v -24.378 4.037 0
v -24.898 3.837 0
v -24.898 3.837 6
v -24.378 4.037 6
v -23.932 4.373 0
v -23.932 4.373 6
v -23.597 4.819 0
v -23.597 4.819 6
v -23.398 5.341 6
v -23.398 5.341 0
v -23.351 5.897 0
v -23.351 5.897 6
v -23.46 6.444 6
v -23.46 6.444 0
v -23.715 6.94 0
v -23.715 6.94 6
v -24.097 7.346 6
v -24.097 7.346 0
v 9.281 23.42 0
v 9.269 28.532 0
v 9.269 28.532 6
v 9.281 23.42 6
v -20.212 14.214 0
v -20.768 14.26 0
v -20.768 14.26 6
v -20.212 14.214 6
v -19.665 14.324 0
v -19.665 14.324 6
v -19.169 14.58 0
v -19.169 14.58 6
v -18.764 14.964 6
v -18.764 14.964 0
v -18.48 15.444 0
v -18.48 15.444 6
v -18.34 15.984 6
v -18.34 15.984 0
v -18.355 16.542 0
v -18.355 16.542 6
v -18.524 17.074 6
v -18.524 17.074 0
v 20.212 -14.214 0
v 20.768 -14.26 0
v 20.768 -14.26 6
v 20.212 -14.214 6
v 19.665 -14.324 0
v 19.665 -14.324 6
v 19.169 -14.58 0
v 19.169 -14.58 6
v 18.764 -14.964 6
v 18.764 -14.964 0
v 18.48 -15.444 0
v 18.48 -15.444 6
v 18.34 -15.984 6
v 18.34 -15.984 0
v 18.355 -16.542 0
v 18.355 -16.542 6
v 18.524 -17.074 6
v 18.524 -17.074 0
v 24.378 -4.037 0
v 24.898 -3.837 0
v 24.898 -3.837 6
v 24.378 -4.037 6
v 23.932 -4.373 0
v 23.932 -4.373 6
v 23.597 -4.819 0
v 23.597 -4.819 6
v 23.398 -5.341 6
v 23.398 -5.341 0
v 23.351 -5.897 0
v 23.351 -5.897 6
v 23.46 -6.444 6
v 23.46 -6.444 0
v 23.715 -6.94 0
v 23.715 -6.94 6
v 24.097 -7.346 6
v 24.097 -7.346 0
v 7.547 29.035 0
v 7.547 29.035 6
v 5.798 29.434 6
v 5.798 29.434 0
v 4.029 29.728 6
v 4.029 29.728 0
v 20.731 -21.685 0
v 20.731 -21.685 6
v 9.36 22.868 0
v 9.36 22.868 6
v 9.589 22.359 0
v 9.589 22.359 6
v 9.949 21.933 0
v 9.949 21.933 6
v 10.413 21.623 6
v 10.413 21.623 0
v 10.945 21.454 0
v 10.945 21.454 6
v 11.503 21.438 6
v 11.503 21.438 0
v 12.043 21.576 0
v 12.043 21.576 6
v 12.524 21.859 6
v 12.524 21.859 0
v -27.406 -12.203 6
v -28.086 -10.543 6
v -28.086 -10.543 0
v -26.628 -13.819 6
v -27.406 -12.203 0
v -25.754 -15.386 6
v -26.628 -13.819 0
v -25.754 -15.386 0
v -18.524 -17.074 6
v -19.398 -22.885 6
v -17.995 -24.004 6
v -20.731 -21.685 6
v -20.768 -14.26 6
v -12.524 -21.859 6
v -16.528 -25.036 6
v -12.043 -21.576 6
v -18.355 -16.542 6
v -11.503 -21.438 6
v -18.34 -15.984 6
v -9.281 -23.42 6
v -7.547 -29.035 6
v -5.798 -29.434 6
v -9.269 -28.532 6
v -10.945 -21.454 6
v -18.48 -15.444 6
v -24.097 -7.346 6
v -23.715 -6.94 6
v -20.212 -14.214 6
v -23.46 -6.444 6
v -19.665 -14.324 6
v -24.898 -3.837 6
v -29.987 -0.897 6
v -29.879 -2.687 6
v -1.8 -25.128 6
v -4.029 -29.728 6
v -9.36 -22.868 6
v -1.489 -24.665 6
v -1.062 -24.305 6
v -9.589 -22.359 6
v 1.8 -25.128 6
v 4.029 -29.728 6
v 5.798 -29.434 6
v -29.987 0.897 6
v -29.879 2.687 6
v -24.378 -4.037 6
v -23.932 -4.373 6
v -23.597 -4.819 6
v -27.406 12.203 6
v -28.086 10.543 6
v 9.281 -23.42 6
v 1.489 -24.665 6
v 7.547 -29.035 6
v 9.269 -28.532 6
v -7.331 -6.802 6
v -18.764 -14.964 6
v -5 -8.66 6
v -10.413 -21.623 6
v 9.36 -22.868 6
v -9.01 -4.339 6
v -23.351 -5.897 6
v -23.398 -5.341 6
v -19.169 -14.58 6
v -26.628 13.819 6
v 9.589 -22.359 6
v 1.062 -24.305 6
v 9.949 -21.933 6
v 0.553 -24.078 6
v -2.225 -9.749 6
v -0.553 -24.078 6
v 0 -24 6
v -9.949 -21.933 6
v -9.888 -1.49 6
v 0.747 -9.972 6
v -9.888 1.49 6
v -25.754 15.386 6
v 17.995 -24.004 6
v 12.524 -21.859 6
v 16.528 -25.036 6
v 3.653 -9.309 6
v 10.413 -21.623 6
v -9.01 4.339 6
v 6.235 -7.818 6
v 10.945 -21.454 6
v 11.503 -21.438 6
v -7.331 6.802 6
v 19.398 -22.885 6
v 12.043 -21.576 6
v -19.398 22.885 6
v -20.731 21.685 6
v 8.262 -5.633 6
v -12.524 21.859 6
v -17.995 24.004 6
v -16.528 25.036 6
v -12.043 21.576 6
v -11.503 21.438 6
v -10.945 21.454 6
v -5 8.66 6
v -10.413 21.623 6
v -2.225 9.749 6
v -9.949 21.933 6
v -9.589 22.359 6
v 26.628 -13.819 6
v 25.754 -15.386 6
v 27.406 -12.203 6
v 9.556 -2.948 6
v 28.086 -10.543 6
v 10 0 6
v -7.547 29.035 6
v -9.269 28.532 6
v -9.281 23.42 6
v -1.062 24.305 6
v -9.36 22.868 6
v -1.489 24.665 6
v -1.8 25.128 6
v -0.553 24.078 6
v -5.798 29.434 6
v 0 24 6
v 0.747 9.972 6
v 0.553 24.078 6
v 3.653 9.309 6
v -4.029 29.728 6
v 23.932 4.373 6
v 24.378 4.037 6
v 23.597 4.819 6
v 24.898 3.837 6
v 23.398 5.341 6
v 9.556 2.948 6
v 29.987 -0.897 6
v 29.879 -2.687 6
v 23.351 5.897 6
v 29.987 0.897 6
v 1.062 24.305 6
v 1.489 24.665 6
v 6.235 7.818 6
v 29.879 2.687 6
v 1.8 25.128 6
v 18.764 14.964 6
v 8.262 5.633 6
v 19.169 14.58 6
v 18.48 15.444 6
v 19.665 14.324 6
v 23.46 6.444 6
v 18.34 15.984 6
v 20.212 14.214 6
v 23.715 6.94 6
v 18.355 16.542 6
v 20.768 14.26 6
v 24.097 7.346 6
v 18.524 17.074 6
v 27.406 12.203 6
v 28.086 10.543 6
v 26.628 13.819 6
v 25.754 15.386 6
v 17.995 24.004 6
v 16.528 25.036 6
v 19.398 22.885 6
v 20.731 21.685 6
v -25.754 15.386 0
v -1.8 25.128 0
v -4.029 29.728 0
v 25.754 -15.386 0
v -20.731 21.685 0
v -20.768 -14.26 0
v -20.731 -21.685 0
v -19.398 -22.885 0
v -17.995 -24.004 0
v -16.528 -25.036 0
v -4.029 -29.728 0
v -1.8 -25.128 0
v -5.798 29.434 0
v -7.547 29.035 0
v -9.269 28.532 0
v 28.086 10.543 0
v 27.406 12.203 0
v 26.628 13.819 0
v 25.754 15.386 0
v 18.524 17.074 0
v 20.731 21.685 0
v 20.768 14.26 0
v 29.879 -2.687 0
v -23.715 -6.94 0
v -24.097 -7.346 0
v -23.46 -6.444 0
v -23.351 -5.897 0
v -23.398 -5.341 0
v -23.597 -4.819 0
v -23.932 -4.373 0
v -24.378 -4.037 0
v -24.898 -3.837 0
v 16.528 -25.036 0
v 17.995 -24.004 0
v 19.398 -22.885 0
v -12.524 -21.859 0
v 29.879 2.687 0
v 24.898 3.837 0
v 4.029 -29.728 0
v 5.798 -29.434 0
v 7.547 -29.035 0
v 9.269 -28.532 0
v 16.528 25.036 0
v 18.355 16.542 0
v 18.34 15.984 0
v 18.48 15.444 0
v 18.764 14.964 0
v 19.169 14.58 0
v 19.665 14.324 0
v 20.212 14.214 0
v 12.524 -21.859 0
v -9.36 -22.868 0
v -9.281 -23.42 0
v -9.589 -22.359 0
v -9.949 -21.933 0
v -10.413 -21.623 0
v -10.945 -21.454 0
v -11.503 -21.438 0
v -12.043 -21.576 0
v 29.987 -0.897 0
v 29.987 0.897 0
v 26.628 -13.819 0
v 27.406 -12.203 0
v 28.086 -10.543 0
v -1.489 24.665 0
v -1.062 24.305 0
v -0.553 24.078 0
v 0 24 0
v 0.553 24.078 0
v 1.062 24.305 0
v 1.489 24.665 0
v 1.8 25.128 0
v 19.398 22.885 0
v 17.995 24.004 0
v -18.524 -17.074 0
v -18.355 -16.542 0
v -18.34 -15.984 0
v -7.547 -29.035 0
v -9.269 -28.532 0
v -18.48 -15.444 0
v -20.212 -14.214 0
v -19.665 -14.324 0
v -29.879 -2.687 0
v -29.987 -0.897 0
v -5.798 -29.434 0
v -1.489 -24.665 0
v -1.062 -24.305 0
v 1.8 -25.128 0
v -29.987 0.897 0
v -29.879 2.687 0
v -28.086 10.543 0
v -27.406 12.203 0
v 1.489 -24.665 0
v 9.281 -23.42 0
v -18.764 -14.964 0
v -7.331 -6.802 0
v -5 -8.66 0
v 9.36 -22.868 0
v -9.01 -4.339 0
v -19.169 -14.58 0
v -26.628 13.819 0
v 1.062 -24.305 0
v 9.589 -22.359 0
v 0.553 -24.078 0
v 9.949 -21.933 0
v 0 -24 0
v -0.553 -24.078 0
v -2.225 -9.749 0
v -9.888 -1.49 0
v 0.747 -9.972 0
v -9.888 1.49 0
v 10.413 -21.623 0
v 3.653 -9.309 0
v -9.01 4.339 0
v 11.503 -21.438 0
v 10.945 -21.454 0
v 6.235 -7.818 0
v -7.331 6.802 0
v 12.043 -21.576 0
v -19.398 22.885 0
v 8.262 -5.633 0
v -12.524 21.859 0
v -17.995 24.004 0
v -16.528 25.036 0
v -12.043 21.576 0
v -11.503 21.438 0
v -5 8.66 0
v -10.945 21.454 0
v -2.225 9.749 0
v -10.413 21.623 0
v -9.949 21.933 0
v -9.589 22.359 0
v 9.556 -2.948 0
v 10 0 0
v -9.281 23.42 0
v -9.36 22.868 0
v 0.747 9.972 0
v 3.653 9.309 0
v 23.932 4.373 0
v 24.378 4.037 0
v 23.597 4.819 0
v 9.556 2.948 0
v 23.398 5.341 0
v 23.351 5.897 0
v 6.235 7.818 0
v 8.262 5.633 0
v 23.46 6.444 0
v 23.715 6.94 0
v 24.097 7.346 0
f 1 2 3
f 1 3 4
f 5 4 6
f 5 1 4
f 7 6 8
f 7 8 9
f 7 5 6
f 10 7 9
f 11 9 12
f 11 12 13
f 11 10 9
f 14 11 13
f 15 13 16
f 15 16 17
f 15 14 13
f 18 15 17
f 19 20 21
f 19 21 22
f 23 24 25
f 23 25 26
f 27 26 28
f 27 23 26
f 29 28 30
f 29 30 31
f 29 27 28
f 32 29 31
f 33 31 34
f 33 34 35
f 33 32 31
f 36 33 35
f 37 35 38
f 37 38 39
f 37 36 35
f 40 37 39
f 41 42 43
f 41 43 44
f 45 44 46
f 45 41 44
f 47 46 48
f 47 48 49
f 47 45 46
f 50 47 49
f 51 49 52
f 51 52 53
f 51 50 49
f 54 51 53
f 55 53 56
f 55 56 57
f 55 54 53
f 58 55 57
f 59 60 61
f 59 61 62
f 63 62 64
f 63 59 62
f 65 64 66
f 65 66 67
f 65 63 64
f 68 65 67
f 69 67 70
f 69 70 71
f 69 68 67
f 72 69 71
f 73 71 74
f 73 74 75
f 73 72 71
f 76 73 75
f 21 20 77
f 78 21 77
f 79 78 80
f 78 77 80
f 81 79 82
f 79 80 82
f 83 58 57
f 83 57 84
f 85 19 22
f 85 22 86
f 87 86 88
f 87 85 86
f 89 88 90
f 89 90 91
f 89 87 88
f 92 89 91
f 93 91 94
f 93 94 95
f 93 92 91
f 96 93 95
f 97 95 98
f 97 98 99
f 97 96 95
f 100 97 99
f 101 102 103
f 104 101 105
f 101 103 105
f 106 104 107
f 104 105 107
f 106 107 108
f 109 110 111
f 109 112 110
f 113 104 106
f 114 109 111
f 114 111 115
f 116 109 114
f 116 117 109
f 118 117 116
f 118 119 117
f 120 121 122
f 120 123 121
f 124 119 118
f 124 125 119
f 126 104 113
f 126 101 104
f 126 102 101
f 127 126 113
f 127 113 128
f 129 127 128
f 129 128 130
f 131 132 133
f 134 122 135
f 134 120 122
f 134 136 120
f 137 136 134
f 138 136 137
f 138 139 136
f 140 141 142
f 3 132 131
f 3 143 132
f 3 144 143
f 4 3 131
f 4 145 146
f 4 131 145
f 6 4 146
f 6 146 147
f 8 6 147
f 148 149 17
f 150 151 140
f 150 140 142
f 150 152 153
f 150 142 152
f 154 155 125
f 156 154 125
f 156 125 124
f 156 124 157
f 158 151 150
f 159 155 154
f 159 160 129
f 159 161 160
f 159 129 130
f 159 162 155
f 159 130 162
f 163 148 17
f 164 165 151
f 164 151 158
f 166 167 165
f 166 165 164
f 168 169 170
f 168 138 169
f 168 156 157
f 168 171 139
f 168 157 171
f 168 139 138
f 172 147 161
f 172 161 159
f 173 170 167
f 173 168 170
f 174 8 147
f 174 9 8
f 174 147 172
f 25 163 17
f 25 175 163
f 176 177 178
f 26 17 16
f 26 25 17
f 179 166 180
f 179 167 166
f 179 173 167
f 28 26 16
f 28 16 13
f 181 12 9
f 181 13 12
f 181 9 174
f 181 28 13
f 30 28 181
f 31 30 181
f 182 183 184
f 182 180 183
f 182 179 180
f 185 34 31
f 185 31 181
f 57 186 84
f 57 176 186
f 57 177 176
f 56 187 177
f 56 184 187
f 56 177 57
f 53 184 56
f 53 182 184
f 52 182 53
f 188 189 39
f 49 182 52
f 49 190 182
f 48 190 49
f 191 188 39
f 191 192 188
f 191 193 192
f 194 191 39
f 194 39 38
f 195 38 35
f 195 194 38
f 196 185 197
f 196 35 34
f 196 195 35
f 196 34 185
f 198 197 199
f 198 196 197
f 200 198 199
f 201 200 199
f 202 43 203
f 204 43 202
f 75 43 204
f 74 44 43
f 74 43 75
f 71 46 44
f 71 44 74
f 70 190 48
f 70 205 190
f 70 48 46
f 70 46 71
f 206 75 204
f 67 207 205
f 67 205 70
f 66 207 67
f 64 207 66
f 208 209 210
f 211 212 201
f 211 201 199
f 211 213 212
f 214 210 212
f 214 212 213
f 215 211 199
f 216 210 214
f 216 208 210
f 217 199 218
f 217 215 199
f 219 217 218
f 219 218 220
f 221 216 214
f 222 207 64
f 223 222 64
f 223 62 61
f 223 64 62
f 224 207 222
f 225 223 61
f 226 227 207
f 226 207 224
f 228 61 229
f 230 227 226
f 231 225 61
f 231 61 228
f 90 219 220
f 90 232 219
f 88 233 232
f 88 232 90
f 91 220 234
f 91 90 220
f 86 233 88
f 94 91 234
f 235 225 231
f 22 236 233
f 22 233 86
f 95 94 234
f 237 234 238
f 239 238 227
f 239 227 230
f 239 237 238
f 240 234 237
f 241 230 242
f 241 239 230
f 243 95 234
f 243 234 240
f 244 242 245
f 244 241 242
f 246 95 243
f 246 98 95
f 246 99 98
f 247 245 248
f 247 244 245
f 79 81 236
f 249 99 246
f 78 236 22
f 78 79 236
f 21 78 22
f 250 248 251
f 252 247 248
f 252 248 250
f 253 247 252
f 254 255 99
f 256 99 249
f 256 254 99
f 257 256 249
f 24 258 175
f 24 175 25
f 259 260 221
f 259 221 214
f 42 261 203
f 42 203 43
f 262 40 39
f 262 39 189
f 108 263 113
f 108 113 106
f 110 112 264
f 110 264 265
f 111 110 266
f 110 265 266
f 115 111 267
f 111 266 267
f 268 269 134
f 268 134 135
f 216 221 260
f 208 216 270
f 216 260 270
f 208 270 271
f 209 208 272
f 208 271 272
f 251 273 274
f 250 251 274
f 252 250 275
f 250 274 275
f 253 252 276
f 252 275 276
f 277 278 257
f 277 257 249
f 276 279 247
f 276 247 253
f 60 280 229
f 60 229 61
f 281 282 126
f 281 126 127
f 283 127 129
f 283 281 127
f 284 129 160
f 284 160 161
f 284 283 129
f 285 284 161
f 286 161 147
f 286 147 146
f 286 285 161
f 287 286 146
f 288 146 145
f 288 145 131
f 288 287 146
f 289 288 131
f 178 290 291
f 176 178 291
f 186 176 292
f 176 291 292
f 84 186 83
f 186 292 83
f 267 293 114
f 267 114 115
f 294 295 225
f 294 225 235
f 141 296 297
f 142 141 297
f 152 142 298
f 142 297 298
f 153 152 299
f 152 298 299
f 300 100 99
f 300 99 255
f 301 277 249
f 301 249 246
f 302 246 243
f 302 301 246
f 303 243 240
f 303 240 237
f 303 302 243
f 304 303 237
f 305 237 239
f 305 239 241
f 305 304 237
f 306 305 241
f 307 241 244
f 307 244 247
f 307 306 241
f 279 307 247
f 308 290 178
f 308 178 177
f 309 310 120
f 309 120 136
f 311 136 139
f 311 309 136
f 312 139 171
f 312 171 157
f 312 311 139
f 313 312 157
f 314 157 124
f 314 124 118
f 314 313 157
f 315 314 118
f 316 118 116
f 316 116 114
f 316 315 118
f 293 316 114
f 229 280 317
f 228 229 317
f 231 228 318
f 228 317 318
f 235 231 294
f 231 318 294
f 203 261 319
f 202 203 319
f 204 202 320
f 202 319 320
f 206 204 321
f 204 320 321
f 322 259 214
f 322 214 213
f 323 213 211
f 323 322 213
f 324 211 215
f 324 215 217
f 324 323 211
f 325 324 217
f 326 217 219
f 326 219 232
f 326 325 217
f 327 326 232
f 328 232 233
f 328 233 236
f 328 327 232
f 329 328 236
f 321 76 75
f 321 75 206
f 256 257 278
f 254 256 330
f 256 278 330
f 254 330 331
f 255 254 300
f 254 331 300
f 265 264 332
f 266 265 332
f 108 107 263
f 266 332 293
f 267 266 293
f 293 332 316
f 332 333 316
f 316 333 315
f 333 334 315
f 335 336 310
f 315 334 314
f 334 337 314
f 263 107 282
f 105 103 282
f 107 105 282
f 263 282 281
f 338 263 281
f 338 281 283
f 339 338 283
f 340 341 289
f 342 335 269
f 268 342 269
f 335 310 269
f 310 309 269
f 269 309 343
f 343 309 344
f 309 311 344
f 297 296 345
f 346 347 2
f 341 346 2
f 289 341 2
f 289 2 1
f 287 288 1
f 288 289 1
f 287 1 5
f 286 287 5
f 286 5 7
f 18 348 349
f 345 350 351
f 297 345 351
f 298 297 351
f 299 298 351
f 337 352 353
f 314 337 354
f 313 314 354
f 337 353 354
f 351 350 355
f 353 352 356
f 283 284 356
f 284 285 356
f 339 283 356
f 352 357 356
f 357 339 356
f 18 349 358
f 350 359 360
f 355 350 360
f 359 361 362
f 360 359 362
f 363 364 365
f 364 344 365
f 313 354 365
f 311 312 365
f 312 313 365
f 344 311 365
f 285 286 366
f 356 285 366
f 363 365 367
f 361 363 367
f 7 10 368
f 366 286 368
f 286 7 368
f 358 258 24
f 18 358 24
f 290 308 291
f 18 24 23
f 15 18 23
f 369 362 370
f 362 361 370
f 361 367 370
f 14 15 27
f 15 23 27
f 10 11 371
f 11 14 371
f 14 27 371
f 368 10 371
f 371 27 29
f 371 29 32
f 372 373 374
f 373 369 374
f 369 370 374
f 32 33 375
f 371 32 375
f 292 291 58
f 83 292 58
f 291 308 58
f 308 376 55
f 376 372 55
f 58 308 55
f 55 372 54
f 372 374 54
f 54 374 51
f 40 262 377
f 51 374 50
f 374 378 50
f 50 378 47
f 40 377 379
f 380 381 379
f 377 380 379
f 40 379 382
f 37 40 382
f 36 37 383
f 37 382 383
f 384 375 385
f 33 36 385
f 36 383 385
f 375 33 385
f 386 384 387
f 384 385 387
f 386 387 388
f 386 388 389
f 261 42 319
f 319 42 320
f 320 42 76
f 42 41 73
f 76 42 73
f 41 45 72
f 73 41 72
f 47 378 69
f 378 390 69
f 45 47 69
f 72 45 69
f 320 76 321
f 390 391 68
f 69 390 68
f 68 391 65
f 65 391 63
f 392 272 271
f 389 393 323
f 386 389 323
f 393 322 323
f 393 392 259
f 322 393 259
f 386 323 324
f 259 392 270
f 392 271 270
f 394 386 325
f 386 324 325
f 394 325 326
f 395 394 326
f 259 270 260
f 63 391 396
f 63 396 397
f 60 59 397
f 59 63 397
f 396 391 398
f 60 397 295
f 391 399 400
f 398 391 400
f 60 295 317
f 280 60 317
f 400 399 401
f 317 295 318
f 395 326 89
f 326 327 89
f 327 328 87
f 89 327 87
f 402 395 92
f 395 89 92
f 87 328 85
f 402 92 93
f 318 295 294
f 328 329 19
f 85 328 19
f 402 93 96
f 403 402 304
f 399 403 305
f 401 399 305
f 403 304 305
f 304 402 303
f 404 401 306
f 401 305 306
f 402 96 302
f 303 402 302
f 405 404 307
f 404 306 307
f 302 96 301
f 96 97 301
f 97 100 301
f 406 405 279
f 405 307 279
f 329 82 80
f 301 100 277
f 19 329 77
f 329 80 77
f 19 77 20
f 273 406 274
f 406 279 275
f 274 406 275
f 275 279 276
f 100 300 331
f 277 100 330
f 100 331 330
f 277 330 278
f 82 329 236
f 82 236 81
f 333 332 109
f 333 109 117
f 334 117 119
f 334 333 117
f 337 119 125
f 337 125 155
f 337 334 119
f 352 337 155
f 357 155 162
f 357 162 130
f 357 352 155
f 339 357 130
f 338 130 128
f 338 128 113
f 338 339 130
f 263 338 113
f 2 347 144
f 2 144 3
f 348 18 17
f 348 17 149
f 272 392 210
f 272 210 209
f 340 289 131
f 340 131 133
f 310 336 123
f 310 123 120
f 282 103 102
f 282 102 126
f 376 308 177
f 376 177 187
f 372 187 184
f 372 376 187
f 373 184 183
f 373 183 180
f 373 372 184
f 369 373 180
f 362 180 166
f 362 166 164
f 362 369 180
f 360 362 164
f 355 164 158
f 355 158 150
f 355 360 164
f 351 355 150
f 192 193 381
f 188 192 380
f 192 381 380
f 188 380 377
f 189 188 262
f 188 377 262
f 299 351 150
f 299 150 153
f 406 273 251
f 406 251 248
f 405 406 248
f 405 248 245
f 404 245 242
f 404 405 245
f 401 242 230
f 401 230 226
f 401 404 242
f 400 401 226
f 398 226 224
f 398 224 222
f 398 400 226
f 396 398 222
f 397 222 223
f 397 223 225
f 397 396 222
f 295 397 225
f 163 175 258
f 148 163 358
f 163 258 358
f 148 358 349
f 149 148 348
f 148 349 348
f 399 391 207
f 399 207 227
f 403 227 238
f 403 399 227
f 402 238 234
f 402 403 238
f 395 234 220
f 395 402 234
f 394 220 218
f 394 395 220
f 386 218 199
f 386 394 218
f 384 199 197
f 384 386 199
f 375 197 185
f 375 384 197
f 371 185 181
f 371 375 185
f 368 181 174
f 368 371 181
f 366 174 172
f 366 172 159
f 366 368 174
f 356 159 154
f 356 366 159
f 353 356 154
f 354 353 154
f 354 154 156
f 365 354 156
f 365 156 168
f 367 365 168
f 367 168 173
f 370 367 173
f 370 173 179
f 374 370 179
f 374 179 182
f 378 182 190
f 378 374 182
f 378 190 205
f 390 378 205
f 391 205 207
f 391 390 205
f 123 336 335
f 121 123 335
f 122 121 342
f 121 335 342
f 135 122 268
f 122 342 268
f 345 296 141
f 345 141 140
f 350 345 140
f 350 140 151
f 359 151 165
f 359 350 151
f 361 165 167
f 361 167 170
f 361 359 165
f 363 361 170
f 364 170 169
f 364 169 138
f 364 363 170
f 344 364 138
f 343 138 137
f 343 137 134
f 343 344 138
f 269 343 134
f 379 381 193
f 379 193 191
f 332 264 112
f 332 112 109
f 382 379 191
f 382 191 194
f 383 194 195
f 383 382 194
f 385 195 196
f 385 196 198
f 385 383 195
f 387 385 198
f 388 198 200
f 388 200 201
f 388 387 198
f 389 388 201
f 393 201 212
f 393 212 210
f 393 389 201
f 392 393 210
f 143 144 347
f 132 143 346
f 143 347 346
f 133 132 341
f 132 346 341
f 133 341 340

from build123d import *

# Parameters (mm, degrees)
SKETCH1_R           = 30
SKETCH1_R_2         = 10
BOSS_EXTRUDE1_DEPTH = 6
CUT_EXTRUDE1_START  = -6
CUT_EXTRUDE1_DEPTH  = 6
CIRPATTERN1_COUNT   = 14


with BuildPart() as part:
    # Sketch1 → Boss-Extrude1 (new body)
    with BuildSketch(Plane.XY):
        Circle(SKETCH1_R)
        Circle(SKETCH1_R_2, mode=Mode.SUBTRACT)
    extrude(amount=BOSS_EXTRUDE1_DEPTH)

    # Sketch2 → Cut-Extrude1 (cut)
    with BuildSketch(Plane.XY.offset(6).offset(CUT_EXTRUDE1_START)):
        with BuildLine():
            Line((-4.028701623, 29.728262028), (-1.799877236, 25.12796678))
            ThreePointArc((-1.799877236, 25.12796678), (0, 24), (1.799877236, 25.12796678))
            Line((1.799877236, 25.12796678), (4.028701623, 29.728262028))
            ThreePointArc((4.028701623, 29.728262028), (0, 30), (-4.028701623, 29.728262028))
        make_face()
    cut_extrude1 = extrude(amount=CUT_EXTRUDE1_DEPTH, mode=Mode.SUBTRACT)

    # CirPattern1: Cut-Extrude1 ×14 about axis
    cirpattern1_axis = Axis((0, 0, 0), (0, 0, 1))
    for i in range(1, CIRPATTERN1_COUNT):
        add(cut_extrude1.rotate(cirpattern1_axis, i * 360 / CIRPATTERN1_COUNT), mode=Mode.SUBTRACT)


solid = part.part
